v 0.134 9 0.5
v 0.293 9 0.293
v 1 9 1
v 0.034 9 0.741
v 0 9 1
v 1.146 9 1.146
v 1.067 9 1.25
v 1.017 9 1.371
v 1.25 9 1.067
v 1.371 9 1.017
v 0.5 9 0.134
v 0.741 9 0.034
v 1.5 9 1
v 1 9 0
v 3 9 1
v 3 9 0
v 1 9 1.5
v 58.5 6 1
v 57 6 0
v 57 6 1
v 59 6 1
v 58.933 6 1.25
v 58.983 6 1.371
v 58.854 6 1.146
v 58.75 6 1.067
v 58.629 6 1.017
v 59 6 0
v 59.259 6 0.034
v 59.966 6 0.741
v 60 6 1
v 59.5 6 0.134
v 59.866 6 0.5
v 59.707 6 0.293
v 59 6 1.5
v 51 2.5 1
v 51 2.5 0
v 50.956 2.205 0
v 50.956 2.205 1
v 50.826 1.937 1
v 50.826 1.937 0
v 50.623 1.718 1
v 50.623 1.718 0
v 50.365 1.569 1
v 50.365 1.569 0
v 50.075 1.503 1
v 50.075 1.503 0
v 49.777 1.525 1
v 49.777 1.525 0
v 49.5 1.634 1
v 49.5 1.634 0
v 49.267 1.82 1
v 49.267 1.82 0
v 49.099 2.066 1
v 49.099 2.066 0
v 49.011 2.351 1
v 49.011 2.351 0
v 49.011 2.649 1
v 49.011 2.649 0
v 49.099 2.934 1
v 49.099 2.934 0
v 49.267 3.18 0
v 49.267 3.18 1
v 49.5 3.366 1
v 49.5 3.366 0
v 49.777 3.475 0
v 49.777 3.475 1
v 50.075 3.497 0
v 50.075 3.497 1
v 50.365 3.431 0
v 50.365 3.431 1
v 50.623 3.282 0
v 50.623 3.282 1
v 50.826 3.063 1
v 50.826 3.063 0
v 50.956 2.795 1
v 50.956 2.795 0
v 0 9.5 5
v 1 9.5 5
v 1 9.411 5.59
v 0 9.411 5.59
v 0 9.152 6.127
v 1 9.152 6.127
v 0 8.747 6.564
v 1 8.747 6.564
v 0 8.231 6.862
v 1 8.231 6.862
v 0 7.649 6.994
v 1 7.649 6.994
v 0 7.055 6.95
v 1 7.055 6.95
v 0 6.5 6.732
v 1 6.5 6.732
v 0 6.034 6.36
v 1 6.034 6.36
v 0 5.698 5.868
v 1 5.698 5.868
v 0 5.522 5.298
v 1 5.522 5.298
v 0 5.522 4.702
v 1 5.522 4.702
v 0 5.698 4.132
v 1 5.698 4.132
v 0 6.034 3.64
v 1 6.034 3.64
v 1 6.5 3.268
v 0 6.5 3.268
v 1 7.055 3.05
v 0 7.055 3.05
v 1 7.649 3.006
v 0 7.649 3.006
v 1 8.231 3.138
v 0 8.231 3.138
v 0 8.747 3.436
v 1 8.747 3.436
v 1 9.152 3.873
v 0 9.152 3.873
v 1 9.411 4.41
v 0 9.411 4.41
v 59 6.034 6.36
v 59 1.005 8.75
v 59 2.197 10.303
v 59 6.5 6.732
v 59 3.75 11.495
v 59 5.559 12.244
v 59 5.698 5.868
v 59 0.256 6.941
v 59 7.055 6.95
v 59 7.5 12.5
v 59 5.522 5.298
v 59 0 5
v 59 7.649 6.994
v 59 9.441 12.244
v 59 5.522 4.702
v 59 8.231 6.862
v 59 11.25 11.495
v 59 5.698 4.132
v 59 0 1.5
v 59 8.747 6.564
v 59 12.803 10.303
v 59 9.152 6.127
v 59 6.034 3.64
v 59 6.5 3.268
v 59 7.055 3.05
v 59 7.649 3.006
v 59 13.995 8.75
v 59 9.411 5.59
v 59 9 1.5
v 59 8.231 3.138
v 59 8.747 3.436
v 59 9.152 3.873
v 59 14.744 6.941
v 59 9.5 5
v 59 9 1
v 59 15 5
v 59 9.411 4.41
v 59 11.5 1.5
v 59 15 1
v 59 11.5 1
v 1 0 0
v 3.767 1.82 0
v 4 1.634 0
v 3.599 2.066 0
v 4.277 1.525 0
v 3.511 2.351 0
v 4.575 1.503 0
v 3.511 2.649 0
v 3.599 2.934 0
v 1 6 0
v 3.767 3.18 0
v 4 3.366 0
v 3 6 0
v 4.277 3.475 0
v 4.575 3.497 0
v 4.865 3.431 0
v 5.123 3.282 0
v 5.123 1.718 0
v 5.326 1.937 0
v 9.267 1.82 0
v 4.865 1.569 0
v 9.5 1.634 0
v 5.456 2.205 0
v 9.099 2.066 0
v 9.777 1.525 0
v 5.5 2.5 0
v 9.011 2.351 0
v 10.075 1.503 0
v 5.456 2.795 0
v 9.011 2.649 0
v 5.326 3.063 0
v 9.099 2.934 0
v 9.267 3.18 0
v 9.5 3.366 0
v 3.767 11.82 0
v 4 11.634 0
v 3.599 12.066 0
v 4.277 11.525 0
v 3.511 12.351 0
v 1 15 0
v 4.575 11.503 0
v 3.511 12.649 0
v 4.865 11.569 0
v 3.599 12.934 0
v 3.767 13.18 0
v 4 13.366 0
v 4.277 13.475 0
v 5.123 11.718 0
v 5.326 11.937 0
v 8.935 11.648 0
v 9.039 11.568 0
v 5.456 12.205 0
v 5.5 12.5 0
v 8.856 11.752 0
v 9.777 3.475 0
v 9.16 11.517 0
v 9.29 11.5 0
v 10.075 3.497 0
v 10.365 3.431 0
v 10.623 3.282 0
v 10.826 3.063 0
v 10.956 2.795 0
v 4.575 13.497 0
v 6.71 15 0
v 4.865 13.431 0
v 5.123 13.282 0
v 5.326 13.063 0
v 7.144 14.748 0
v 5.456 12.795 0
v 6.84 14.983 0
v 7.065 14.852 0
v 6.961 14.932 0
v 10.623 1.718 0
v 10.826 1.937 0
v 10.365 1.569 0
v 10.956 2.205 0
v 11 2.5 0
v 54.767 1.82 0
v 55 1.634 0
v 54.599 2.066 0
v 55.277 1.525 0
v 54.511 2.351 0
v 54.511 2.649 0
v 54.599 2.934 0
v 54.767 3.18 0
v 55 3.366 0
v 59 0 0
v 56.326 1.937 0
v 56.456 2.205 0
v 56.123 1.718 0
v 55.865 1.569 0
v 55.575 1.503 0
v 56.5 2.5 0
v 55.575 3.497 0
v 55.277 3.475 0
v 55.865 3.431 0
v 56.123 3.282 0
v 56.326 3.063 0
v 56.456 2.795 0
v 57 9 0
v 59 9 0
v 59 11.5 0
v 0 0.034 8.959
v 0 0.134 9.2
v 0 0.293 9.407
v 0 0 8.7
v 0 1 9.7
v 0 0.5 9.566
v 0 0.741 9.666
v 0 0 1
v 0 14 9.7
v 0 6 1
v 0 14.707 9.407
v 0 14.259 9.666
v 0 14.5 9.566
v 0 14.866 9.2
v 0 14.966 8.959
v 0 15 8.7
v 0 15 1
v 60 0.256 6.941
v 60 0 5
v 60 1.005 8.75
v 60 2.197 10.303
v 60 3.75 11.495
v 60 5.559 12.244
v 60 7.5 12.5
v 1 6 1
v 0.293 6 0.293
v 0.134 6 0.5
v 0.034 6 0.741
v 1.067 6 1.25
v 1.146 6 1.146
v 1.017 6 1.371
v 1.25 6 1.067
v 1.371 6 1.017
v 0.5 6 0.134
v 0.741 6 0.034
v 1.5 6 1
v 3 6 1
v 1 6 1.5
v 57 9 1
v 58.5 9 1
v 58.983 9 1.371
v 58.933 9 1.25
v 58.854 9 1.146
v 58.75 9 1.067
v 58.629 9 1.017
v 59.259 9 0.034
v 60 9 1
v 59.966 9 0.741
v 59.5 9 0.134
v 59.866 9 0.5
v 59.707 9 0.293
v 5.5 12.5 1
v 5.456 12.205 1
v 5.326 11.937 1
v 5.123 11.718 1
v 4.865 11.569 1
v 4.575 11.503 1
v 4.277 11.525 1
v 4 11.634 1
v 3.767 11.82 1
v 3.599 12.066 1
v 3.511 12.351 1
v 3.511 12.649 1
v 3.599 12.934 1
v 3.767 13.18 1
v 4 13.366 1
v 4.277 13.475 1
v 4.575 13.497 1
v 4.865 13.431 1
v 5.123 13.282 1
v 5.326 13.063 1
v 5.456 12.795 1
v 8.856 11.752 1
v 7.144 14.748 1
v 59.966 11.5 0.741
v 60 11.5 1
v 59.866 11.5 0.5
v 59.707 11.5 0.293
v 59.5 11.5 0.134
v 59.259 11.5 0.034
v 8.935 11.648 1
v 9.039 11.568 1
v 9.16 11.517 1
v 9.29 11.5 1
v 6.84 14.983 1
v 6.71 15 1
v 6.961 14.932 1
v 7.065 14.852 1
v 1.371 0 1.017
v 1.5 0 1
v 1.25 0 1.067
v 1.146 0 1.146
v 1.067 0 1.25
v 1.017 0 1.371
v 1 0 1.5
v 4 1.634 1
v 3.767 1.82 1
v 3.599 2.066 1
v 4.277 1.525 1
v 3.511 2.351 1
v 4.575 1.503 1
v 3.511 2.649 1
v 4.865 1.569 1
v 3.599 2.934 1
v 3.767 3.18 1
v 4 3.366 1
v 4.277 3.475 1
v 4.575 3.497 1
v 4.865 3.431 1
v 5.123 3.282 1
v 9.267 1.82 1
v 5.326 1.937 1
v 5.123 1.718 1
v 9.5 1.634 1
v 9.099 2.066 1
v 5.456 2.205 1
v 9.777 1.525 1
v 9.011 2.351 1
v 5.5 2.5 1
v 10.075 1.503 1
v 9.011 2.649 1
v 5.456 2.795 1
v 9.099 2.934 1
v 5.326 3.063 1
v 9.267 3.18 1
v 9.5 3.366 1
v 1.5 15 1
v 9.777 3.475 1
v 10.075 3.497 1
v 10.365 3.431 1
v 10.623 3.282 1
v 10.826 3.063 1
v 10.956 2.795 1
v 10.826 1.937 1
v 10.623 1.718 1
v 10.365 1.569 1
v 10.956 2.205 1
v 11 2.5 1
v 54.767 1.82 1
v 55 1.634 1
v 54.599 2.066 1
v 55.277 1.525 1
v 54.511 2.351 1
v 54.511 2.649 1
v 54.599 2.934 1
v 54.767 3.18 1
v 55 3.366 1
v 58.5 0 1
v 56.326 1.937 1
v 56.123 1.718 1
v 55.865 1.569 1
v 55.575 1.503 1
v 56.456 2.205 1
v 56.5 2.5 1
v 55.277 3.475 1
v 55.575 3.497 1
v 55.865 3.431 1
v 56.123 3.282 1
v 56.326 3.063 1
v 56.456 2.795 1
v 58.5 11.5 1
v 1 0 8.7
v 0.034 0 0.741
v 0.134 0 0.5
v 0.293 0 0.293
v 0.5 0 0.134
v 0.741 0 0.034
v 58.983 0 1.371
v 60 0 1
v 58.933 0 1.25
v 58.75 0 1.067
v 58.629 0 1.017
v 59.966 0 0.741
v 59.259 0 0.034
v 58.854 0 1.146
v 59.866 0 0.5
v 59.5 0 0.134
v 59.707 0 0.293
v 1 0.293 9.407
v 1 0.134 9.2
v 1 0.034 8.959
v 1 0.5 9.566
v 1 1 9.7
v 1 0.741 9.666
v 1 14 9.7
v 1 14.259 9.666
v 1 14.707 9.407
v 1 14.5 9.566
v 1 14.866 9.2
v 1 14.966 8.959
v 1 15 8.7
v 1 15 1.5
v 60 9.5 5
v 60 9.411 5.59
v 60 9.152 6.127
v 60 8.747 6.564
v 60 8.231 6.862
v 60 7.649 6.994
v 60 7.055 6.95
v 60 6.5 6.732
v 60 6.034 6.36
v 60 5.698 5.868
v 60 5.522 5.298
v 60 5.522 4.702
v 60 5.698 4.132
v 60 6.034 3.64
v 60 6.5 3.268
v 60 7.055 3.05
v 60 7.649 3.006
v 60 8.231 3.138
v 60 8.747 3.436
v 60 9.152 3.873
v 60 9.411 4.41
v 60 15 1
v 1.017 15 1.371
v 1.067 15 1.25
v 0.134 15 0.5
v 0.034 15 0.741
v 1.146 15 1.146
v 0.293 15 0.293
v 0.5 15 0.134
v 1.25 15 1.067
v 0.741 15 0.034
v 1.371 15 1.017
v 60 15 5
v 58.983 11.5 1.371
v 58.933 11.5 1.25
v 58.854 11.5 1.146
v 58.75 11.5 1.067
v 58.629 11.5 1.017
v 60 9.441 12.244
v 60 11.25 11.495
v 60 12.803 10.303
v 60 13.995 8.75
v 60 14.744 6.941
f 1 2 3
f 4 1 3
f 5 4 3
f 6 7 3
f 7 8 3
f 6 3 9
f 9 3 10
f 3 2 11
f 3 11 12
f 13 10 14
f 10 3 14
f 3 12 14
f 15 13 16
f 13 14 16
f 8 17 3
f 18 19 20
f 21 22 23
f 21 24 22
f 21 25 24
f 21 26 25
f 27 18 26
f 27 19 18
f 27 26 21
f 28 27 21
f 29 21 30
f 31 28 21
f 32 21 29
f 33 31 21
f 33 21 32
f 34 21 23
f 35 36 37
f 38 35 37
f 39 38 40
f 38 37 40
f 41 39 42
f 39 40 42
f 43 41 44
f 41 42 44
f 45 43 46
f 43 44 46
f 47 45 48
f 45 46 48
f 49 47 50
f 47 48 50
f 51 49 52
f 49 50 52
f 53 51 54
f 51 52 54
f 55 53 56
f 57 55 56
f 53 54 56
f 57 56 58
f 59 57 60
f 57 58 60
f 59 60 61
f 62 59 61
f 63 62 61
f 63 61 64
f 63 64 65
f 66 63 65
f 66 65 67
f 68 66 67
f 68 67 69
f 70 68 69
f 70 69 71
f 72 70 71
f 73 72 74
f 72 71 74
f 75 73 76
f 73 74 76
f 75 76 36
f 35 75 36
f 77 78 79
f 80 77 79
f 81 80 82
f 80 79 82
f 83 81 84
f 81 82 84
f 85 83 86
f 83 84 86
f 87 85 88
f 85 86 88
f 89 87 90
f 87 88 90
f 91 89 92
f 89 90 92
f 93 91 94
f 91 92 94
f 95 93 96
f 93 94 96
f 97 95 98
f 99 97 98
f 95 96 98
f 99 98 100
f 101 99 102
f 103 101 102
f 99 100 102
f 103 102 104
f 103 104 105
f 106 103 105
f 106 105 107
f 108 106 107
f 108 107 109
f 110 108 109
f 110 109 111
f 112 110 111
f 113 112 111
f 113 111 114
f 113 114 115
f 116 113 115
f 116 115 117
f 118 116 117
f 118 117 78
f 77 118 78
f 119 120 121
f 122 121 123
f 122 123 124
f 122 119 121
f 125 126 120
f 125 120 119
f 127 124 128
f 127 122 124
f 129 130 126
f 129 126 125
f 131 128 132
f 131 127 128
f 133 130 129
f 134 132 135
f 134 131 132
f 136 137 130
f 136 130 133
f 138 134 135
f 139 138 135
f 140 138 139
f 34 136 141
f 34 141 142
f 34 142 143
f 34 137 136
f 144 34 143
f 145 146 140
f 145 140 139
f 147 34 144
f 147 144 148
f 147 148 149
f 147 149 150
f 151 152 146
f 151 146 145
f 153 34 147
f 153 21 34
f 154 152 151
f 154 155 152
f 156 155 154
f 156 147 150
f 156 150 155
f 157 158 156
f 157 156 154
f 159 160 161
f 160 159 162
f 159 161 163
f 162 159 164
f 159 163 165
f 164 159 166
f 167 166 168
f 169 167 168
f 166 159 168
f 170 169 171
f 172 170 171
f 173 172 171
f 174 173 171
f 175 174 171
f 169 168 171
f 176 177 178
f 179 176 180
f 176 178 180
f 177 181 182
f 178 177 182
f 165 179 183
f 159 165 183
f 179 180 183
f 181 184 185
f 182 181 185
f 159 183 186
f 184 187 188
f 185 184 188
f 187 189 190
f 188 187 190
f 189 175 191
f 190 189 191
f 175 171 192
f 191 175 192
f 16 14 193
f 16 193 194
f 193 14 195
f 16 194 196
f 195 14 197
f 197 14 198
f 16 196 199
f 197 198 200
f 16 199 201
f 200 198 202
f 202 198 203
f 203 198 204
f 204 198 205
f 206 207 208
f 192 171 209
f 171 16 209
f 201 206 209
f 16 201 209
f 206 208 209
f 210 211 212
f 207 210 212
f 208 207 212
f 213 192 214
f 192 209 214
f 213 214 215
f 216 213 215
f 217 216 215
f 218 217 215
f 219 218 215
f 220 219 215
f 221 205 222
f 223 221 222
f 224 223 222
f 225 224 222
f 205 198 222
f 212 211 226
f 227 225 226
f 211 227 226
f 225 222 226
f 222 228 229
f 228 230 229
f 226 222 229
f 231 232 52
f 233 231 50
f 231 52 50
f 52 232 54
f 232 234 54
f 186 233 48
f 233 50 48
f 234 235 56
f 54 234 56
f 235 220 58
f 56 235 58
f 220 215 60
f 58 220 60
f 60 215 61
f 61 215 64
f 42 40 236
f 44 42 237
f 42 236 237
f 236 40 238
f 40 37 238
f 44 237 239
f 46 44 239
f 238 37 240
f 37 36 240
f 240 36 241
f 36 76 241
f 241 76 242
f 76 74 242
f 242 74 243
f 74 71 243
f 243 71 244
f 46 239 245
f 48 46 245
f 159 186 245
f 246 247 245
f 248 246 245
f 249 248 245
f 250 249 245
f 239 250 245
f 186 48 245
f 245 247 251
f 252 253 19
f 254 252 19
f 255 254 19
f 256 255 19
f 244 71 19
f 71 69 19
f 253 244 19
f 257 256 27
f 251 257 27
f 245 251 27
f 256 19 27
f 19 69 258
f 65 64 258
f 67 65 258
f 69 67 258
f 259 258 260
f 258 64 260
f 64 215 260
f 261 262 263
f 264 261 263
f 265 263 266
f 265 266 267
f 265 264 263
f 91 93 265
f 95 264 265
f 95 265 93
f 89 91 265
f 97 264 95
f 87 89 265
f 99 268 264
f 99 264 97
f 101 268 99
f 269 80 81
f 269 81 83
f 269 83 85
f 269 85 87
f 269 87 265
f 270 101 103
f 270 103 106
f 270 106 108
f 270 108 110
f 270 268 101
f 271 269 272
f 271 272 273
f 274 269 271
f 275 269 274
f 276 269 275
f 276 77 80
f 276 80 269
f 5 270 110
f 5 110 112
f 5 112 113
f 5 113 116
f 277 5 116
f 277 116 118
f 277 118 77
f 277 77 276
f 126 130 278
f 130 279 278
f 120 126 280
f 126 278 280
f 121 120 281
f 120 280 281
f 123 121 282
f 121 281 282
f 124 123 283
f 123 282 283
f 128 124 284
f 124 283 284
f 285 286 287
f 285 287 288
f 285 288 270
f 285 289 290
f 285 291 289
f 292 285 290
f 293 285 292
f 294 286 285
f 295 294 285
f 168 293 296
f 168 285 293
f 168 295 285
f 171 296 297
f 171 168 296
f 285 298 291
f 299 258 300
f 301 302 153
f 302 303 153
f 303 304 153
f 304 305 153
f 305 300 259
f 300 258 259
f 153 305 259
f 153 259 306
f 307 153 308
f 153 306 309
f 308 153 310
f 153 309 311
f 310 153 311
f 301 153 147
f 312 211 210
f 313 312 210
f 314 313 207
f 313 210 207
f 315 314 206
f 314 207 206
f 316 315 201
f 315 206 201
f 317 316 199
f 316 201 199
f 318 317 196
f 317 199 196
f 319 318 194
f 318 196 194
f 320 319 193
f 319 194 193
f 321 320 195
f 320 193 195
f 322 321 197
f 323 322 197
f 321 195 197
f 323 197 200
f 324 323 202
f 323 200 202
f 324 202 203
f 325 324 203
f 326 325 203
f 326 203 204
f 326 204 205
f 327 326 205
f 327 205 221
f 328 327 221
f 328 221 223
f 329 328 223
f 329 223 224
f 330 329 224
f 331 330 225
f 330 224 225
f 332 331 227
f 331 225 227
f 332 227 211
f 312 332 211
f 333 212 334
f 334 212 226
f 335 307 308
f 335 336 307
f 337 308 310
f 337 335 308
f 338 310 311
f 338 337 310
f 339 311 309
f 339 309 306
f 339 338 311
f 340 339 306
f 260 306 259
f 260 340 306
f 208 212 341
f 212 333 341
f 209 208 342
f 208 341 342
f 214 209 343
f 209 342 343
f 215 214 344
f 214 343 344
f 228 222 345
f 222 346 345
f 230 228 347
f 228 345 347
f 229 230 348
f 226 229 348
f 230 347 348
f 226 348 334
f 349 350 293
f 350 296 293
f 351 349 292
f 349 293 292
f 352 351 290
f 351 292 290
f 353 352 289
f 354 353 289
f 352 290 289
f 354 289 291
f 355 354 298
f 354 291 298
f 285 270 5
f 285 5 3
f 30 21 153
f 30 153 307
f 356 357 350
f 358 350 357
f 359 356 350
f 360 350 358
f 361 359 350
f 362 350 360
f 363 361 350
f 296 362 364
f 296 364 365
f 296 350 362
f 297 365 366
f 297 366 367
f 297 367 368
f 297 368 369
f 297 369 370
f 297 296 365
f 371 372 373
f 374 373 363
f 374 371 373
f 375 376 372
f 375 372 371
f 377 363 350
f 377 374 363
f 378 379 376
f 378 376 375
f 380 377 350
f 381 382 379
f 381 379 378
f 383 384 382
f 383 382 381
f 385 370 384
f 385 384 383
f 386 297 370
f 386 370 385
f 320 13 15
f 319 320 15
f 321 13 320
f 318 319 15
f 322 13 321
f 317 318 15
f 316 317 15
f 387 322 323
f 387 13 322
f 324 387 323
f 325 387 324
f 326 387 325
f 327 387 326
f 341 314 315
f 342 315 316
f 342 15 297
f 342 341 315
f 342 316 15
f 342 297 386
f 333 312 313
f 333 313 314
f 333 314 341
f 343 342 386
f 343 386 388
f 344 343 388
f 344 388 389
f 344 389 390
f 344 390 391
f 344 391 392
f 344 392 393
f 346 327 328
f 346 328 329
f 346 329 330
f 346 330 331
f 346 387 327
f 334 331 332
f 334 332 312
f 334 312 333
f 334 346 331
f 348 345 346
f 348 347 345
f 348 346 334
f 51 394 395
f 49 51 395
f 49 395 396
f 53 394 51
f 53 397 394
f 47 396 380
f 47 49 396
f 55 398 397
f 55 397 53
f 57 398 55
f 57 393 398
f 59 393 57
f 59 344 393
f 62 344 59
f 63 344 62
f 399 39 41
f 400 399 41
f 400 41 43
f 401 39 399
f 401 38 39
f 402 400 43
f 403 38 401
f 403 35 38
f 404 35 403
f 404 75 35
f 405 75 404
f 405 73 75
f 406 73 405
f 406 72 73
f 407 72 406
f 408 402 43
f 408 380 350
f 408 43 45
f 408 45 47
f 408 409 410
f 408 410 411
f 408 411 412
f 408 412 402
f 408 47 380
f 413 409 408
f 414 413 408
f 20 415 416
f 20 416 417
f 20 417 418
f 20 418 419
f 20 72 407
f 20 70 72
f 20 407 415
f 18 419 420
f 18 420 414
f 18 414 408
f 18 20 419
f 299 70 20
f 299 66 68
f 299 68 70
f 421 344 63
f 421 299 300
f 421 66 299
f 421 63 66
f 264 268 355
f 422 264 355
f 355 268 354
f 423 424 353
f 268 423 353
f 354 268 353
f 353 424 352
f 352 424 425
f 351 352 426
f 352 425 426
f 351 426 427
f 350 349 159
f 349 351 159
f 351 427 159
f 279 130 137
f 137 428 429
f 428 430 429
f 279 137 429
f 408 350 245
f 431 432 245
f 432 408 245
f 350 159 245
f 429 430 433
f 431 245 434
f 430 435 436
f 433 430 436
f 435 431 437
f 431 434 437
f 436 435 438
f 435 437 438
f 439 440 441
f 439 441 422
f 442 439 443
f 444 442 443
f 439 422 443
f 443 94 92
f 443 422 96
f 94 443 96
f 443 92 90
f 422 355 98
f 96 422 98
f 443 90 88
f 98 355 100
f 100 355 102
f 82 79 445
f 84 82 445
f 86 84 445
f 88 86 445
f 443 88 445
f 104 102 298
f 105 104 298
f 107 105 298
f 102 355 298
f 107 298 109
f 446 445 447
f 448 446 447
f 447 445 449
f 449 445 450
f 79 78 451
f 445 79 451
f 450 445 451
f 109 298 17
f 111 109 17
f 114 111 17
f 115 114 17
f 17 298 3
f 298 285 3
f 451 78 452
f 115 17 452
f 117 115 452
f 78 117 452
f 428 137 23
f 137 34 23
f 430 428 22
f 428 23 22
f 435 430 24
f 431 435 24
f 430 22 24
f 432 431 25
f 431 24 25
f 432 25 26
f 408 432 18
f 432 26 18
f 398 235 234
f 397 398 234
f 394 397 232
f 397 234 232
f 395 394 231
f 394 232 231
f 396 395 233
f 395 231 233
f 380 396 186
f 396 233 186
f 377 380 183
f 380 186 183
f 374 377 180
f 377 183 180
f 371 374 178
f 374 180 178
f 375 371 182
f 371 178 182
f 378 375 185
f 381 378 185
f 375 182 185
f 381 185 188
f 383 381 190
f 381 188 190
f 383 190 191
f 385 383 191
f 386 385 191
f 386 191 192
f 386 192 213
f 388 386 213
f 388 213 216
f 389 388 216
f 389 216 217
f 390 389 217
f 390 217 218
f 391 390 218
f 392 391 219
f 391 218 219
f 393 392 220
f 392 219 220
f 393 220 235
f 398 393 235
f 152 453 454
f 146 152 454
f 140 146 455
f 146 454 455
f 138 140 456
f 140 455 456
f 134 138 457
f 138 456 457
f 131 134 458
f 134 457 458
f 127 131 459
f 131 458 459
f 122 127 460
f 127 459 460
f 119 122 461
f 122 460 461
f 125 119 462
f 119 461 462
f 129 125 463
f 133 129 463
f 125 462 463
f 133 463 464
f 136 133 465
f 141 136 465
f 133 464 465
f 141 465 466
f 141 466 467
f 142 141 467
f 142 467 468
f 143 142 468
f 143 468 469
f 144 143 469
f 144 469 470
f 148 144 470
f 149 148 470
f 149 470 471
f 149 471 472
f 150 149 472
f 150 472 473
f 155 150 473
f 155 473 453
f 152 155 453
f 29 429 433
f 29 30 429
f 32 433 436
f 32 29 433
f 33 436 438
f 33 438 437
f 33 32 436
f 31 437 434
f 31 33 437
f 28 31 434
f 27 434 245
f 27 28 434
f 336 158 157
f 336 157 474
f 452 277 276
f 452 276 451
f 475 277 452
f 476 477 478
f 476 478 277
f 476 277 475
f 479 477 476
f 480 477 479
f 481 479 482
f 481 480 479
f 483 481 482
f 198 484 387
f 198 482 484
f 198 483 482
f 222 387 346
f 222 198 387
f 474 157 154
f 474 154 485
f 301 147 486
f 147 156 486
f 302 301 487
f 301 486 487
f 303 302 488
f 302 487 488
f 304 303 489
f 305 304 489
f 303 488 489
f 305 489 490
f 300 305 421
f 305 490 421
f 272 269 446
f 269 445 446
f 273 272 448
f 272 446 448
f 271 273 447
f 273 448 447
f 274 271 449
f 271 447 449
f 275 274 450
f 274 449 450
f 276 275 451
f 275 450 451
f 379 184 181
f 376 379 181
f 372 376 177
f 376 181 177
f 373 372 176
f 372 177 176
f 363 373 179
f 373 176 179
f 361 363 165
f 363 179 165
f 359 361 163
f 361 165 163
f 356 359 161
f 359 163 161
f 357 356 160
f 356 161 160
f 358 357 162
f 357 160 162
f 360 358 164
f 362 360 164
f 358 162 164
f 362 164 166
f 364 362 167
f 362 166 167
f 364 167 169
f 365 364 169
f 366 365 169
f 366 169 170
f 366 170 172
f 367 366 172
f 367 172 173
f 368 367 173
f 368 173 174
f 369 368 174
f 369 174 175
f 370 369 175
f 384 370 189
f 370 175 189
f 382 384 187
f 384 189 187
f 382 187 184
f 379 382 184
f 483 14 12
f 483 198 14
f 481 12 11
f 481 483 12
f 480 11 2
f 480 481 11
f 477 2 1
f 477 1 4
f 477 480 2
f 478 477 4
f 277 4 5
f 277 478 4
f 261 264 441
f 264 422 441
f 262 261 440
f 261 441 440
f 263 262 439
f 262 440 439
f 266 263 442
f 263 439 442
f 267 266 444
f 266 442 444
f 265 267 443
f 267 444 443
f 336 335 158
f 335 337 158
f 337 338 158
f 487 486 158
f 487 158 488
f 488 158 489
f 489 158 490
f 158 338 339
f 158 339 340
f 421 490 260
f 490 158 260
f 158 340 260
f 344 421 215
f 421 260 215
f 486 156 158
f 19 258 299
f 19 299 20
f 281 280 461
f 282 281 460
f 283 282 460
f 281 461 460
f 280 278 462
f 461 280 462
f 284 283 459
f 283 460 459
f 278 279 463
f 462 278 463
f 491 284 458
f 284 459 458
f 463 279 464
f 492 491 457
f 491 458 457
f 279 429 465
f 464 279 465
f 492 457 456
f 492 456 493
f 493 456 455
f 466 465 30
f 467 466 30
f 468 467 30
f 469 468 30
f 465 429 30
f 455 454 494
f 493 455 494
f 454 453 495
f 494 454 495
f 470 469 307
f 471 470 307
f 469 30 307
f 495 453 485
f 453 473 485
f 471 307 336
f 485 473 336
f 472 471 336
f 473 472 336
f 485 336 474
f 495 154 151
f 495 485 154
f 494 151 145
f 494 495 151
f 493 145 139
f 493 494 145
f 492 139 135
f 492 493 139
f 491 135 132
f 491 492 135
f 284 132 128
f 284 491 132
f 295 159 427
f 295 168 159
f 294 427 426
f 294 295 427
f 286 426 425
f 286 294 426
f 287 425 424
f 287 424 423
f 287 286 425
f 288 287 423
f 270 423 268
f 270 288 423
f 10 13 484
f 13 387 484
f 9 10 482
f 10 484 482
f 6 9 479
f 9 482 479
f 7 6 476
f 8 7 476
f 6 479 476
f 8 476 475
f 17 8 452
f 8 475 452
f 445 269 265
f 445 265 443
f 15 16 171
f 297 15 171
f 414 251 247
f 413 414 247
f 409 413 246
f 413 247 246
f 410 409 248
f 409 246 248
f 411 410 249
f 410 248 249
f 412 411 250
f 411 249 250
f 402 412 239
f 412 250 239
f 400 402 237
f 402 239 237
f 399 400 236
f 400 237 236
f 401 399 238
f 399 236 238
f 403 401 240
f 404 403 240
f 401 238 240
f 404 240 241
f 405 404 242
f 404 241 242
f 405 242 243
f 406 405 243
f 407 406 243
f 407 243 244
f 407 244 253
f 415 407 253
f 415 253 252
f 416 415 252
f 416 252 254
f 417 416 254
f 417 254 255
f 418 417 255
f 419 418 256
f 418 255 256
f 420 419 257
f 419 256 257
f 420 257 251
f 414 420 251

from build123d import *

# Parameters (mm, degrees)
F0_W      = 60
F0_H      = 15
F1_DEPTH  = 1
F2_W      = 1
F2_H      = 15
F3_DEPTH  = 8.7
F4_W      = 1
F4_H      = 15
F5_DEPTH  = 11.5
F6_W      = 3
F6_H      = 3
F6_R      = 1
F7_DEPTH  = 1
F8_R      = 7.49999
F9_R      = 0.5
F10_R     = 1
F11_R     = 2
F12_DEPTH = 60.001


# Not quite as in the source:
# - a fillet or chamfer is up to 0.001 mm smaller than in the source, because OpenCascade refuses the exact size


with BuildPart() as f1:
    # F0 (on Top) → F1 (new body)
    with BuildSketch(Plane.XY):
        with Locations((30, 7.5)):
            Rectangle(F0_W, F0_H)
    extrude(amount=F1_DEPTH)

    # F2 (on face) → F3 (join)
    with BuildSketch(Plane.XY.offset(1)):
        with Locations((0.5, 7.5)):
            Rectangle(F2_W, F2_H)
    extrude(amount=F3_DEPTH)

    # F4 (on face) → F5 (join)
    with BuildSketch(Plane.XY.offset(1)):
        with Locations((59.5, 7.5)):
            Rectangle(F4_W, F4_H)
    extrude(amount=F5_DEPTH)

    # F6 (on face) → F7 (cut, through all)
    with BuildSketch(Plane(origin=(0, 0, 0), x_dir=(1, 0, 0), z_dir=(0, 0, -1))):
        with Locations((1.5, -7.5)):
            Rectangle(F6_W, F6_H)
        with Locations((4.5, -2.5)):
            Circle(F6_R)
        with Locations((10, -2.5)):
            Circle(F6_R)
        with Locations((50, -2.5)):
            Circle(F6_R)
        with Locations((55.5, -2.5)):
            Circle(F6_R)
        with Locations((58.5, -7.5)):
            Rectangle(F6_W, F6_H)
        with Locations((4.5, -12.5)):
            Circle(F6_R)
        Polygon((9, -11.5), (7, -15), (60, -15), (60, -11.5), align=None)
    extrude(amount=-F7_DEPTH, mode=Mode.SUBTRACT)

    # F8 (radius 7.5 in the source; OpenCascade refuses exactly that, so slightly less here)
    f8_edges = [f1.edges().sort_by_distance(p)[0] for p in [
        (59.5, 0, 12.5),
        (59.5, 15, 12.5),
    ]]
    fillet(f8_edges, radius=F8_R)

    # F9
    f9_edges = [f1.edges().sort_by_distance(p)[0] for p in [
        (59, 3, 1),
        (59, 10.25, 1),
        (1, 3, 1),
        (1, 12, 1),
        (7, 15, 0.5),
        (9, 11.5, 0.5),
    ]]
    fillet(f9_edges, radius=F9_R)

    # F10
    f10_edges = [f1.edges().sort_by_distance(p)[0] for p in [
        (60, 10.25, 0),
        (60, 3, 0),
        (0, 12, 0),
        (0, 3, 0),
        (0.5, 0, 9.7),
        (0.5, 15, 9.7),
    ]]
    fillet(f10_edges, radius=F10_R)

    # F11 (on face) → F12 (cut, through all)
    with BuildSketch(Plane.YZ.offset(60)):
        with Locations((7.5, 5)):
            Circle(F11_R)
    extrude(amount=-F12_DEPTH, mode=Mode.SUBTRACT)


solid = f1.part
